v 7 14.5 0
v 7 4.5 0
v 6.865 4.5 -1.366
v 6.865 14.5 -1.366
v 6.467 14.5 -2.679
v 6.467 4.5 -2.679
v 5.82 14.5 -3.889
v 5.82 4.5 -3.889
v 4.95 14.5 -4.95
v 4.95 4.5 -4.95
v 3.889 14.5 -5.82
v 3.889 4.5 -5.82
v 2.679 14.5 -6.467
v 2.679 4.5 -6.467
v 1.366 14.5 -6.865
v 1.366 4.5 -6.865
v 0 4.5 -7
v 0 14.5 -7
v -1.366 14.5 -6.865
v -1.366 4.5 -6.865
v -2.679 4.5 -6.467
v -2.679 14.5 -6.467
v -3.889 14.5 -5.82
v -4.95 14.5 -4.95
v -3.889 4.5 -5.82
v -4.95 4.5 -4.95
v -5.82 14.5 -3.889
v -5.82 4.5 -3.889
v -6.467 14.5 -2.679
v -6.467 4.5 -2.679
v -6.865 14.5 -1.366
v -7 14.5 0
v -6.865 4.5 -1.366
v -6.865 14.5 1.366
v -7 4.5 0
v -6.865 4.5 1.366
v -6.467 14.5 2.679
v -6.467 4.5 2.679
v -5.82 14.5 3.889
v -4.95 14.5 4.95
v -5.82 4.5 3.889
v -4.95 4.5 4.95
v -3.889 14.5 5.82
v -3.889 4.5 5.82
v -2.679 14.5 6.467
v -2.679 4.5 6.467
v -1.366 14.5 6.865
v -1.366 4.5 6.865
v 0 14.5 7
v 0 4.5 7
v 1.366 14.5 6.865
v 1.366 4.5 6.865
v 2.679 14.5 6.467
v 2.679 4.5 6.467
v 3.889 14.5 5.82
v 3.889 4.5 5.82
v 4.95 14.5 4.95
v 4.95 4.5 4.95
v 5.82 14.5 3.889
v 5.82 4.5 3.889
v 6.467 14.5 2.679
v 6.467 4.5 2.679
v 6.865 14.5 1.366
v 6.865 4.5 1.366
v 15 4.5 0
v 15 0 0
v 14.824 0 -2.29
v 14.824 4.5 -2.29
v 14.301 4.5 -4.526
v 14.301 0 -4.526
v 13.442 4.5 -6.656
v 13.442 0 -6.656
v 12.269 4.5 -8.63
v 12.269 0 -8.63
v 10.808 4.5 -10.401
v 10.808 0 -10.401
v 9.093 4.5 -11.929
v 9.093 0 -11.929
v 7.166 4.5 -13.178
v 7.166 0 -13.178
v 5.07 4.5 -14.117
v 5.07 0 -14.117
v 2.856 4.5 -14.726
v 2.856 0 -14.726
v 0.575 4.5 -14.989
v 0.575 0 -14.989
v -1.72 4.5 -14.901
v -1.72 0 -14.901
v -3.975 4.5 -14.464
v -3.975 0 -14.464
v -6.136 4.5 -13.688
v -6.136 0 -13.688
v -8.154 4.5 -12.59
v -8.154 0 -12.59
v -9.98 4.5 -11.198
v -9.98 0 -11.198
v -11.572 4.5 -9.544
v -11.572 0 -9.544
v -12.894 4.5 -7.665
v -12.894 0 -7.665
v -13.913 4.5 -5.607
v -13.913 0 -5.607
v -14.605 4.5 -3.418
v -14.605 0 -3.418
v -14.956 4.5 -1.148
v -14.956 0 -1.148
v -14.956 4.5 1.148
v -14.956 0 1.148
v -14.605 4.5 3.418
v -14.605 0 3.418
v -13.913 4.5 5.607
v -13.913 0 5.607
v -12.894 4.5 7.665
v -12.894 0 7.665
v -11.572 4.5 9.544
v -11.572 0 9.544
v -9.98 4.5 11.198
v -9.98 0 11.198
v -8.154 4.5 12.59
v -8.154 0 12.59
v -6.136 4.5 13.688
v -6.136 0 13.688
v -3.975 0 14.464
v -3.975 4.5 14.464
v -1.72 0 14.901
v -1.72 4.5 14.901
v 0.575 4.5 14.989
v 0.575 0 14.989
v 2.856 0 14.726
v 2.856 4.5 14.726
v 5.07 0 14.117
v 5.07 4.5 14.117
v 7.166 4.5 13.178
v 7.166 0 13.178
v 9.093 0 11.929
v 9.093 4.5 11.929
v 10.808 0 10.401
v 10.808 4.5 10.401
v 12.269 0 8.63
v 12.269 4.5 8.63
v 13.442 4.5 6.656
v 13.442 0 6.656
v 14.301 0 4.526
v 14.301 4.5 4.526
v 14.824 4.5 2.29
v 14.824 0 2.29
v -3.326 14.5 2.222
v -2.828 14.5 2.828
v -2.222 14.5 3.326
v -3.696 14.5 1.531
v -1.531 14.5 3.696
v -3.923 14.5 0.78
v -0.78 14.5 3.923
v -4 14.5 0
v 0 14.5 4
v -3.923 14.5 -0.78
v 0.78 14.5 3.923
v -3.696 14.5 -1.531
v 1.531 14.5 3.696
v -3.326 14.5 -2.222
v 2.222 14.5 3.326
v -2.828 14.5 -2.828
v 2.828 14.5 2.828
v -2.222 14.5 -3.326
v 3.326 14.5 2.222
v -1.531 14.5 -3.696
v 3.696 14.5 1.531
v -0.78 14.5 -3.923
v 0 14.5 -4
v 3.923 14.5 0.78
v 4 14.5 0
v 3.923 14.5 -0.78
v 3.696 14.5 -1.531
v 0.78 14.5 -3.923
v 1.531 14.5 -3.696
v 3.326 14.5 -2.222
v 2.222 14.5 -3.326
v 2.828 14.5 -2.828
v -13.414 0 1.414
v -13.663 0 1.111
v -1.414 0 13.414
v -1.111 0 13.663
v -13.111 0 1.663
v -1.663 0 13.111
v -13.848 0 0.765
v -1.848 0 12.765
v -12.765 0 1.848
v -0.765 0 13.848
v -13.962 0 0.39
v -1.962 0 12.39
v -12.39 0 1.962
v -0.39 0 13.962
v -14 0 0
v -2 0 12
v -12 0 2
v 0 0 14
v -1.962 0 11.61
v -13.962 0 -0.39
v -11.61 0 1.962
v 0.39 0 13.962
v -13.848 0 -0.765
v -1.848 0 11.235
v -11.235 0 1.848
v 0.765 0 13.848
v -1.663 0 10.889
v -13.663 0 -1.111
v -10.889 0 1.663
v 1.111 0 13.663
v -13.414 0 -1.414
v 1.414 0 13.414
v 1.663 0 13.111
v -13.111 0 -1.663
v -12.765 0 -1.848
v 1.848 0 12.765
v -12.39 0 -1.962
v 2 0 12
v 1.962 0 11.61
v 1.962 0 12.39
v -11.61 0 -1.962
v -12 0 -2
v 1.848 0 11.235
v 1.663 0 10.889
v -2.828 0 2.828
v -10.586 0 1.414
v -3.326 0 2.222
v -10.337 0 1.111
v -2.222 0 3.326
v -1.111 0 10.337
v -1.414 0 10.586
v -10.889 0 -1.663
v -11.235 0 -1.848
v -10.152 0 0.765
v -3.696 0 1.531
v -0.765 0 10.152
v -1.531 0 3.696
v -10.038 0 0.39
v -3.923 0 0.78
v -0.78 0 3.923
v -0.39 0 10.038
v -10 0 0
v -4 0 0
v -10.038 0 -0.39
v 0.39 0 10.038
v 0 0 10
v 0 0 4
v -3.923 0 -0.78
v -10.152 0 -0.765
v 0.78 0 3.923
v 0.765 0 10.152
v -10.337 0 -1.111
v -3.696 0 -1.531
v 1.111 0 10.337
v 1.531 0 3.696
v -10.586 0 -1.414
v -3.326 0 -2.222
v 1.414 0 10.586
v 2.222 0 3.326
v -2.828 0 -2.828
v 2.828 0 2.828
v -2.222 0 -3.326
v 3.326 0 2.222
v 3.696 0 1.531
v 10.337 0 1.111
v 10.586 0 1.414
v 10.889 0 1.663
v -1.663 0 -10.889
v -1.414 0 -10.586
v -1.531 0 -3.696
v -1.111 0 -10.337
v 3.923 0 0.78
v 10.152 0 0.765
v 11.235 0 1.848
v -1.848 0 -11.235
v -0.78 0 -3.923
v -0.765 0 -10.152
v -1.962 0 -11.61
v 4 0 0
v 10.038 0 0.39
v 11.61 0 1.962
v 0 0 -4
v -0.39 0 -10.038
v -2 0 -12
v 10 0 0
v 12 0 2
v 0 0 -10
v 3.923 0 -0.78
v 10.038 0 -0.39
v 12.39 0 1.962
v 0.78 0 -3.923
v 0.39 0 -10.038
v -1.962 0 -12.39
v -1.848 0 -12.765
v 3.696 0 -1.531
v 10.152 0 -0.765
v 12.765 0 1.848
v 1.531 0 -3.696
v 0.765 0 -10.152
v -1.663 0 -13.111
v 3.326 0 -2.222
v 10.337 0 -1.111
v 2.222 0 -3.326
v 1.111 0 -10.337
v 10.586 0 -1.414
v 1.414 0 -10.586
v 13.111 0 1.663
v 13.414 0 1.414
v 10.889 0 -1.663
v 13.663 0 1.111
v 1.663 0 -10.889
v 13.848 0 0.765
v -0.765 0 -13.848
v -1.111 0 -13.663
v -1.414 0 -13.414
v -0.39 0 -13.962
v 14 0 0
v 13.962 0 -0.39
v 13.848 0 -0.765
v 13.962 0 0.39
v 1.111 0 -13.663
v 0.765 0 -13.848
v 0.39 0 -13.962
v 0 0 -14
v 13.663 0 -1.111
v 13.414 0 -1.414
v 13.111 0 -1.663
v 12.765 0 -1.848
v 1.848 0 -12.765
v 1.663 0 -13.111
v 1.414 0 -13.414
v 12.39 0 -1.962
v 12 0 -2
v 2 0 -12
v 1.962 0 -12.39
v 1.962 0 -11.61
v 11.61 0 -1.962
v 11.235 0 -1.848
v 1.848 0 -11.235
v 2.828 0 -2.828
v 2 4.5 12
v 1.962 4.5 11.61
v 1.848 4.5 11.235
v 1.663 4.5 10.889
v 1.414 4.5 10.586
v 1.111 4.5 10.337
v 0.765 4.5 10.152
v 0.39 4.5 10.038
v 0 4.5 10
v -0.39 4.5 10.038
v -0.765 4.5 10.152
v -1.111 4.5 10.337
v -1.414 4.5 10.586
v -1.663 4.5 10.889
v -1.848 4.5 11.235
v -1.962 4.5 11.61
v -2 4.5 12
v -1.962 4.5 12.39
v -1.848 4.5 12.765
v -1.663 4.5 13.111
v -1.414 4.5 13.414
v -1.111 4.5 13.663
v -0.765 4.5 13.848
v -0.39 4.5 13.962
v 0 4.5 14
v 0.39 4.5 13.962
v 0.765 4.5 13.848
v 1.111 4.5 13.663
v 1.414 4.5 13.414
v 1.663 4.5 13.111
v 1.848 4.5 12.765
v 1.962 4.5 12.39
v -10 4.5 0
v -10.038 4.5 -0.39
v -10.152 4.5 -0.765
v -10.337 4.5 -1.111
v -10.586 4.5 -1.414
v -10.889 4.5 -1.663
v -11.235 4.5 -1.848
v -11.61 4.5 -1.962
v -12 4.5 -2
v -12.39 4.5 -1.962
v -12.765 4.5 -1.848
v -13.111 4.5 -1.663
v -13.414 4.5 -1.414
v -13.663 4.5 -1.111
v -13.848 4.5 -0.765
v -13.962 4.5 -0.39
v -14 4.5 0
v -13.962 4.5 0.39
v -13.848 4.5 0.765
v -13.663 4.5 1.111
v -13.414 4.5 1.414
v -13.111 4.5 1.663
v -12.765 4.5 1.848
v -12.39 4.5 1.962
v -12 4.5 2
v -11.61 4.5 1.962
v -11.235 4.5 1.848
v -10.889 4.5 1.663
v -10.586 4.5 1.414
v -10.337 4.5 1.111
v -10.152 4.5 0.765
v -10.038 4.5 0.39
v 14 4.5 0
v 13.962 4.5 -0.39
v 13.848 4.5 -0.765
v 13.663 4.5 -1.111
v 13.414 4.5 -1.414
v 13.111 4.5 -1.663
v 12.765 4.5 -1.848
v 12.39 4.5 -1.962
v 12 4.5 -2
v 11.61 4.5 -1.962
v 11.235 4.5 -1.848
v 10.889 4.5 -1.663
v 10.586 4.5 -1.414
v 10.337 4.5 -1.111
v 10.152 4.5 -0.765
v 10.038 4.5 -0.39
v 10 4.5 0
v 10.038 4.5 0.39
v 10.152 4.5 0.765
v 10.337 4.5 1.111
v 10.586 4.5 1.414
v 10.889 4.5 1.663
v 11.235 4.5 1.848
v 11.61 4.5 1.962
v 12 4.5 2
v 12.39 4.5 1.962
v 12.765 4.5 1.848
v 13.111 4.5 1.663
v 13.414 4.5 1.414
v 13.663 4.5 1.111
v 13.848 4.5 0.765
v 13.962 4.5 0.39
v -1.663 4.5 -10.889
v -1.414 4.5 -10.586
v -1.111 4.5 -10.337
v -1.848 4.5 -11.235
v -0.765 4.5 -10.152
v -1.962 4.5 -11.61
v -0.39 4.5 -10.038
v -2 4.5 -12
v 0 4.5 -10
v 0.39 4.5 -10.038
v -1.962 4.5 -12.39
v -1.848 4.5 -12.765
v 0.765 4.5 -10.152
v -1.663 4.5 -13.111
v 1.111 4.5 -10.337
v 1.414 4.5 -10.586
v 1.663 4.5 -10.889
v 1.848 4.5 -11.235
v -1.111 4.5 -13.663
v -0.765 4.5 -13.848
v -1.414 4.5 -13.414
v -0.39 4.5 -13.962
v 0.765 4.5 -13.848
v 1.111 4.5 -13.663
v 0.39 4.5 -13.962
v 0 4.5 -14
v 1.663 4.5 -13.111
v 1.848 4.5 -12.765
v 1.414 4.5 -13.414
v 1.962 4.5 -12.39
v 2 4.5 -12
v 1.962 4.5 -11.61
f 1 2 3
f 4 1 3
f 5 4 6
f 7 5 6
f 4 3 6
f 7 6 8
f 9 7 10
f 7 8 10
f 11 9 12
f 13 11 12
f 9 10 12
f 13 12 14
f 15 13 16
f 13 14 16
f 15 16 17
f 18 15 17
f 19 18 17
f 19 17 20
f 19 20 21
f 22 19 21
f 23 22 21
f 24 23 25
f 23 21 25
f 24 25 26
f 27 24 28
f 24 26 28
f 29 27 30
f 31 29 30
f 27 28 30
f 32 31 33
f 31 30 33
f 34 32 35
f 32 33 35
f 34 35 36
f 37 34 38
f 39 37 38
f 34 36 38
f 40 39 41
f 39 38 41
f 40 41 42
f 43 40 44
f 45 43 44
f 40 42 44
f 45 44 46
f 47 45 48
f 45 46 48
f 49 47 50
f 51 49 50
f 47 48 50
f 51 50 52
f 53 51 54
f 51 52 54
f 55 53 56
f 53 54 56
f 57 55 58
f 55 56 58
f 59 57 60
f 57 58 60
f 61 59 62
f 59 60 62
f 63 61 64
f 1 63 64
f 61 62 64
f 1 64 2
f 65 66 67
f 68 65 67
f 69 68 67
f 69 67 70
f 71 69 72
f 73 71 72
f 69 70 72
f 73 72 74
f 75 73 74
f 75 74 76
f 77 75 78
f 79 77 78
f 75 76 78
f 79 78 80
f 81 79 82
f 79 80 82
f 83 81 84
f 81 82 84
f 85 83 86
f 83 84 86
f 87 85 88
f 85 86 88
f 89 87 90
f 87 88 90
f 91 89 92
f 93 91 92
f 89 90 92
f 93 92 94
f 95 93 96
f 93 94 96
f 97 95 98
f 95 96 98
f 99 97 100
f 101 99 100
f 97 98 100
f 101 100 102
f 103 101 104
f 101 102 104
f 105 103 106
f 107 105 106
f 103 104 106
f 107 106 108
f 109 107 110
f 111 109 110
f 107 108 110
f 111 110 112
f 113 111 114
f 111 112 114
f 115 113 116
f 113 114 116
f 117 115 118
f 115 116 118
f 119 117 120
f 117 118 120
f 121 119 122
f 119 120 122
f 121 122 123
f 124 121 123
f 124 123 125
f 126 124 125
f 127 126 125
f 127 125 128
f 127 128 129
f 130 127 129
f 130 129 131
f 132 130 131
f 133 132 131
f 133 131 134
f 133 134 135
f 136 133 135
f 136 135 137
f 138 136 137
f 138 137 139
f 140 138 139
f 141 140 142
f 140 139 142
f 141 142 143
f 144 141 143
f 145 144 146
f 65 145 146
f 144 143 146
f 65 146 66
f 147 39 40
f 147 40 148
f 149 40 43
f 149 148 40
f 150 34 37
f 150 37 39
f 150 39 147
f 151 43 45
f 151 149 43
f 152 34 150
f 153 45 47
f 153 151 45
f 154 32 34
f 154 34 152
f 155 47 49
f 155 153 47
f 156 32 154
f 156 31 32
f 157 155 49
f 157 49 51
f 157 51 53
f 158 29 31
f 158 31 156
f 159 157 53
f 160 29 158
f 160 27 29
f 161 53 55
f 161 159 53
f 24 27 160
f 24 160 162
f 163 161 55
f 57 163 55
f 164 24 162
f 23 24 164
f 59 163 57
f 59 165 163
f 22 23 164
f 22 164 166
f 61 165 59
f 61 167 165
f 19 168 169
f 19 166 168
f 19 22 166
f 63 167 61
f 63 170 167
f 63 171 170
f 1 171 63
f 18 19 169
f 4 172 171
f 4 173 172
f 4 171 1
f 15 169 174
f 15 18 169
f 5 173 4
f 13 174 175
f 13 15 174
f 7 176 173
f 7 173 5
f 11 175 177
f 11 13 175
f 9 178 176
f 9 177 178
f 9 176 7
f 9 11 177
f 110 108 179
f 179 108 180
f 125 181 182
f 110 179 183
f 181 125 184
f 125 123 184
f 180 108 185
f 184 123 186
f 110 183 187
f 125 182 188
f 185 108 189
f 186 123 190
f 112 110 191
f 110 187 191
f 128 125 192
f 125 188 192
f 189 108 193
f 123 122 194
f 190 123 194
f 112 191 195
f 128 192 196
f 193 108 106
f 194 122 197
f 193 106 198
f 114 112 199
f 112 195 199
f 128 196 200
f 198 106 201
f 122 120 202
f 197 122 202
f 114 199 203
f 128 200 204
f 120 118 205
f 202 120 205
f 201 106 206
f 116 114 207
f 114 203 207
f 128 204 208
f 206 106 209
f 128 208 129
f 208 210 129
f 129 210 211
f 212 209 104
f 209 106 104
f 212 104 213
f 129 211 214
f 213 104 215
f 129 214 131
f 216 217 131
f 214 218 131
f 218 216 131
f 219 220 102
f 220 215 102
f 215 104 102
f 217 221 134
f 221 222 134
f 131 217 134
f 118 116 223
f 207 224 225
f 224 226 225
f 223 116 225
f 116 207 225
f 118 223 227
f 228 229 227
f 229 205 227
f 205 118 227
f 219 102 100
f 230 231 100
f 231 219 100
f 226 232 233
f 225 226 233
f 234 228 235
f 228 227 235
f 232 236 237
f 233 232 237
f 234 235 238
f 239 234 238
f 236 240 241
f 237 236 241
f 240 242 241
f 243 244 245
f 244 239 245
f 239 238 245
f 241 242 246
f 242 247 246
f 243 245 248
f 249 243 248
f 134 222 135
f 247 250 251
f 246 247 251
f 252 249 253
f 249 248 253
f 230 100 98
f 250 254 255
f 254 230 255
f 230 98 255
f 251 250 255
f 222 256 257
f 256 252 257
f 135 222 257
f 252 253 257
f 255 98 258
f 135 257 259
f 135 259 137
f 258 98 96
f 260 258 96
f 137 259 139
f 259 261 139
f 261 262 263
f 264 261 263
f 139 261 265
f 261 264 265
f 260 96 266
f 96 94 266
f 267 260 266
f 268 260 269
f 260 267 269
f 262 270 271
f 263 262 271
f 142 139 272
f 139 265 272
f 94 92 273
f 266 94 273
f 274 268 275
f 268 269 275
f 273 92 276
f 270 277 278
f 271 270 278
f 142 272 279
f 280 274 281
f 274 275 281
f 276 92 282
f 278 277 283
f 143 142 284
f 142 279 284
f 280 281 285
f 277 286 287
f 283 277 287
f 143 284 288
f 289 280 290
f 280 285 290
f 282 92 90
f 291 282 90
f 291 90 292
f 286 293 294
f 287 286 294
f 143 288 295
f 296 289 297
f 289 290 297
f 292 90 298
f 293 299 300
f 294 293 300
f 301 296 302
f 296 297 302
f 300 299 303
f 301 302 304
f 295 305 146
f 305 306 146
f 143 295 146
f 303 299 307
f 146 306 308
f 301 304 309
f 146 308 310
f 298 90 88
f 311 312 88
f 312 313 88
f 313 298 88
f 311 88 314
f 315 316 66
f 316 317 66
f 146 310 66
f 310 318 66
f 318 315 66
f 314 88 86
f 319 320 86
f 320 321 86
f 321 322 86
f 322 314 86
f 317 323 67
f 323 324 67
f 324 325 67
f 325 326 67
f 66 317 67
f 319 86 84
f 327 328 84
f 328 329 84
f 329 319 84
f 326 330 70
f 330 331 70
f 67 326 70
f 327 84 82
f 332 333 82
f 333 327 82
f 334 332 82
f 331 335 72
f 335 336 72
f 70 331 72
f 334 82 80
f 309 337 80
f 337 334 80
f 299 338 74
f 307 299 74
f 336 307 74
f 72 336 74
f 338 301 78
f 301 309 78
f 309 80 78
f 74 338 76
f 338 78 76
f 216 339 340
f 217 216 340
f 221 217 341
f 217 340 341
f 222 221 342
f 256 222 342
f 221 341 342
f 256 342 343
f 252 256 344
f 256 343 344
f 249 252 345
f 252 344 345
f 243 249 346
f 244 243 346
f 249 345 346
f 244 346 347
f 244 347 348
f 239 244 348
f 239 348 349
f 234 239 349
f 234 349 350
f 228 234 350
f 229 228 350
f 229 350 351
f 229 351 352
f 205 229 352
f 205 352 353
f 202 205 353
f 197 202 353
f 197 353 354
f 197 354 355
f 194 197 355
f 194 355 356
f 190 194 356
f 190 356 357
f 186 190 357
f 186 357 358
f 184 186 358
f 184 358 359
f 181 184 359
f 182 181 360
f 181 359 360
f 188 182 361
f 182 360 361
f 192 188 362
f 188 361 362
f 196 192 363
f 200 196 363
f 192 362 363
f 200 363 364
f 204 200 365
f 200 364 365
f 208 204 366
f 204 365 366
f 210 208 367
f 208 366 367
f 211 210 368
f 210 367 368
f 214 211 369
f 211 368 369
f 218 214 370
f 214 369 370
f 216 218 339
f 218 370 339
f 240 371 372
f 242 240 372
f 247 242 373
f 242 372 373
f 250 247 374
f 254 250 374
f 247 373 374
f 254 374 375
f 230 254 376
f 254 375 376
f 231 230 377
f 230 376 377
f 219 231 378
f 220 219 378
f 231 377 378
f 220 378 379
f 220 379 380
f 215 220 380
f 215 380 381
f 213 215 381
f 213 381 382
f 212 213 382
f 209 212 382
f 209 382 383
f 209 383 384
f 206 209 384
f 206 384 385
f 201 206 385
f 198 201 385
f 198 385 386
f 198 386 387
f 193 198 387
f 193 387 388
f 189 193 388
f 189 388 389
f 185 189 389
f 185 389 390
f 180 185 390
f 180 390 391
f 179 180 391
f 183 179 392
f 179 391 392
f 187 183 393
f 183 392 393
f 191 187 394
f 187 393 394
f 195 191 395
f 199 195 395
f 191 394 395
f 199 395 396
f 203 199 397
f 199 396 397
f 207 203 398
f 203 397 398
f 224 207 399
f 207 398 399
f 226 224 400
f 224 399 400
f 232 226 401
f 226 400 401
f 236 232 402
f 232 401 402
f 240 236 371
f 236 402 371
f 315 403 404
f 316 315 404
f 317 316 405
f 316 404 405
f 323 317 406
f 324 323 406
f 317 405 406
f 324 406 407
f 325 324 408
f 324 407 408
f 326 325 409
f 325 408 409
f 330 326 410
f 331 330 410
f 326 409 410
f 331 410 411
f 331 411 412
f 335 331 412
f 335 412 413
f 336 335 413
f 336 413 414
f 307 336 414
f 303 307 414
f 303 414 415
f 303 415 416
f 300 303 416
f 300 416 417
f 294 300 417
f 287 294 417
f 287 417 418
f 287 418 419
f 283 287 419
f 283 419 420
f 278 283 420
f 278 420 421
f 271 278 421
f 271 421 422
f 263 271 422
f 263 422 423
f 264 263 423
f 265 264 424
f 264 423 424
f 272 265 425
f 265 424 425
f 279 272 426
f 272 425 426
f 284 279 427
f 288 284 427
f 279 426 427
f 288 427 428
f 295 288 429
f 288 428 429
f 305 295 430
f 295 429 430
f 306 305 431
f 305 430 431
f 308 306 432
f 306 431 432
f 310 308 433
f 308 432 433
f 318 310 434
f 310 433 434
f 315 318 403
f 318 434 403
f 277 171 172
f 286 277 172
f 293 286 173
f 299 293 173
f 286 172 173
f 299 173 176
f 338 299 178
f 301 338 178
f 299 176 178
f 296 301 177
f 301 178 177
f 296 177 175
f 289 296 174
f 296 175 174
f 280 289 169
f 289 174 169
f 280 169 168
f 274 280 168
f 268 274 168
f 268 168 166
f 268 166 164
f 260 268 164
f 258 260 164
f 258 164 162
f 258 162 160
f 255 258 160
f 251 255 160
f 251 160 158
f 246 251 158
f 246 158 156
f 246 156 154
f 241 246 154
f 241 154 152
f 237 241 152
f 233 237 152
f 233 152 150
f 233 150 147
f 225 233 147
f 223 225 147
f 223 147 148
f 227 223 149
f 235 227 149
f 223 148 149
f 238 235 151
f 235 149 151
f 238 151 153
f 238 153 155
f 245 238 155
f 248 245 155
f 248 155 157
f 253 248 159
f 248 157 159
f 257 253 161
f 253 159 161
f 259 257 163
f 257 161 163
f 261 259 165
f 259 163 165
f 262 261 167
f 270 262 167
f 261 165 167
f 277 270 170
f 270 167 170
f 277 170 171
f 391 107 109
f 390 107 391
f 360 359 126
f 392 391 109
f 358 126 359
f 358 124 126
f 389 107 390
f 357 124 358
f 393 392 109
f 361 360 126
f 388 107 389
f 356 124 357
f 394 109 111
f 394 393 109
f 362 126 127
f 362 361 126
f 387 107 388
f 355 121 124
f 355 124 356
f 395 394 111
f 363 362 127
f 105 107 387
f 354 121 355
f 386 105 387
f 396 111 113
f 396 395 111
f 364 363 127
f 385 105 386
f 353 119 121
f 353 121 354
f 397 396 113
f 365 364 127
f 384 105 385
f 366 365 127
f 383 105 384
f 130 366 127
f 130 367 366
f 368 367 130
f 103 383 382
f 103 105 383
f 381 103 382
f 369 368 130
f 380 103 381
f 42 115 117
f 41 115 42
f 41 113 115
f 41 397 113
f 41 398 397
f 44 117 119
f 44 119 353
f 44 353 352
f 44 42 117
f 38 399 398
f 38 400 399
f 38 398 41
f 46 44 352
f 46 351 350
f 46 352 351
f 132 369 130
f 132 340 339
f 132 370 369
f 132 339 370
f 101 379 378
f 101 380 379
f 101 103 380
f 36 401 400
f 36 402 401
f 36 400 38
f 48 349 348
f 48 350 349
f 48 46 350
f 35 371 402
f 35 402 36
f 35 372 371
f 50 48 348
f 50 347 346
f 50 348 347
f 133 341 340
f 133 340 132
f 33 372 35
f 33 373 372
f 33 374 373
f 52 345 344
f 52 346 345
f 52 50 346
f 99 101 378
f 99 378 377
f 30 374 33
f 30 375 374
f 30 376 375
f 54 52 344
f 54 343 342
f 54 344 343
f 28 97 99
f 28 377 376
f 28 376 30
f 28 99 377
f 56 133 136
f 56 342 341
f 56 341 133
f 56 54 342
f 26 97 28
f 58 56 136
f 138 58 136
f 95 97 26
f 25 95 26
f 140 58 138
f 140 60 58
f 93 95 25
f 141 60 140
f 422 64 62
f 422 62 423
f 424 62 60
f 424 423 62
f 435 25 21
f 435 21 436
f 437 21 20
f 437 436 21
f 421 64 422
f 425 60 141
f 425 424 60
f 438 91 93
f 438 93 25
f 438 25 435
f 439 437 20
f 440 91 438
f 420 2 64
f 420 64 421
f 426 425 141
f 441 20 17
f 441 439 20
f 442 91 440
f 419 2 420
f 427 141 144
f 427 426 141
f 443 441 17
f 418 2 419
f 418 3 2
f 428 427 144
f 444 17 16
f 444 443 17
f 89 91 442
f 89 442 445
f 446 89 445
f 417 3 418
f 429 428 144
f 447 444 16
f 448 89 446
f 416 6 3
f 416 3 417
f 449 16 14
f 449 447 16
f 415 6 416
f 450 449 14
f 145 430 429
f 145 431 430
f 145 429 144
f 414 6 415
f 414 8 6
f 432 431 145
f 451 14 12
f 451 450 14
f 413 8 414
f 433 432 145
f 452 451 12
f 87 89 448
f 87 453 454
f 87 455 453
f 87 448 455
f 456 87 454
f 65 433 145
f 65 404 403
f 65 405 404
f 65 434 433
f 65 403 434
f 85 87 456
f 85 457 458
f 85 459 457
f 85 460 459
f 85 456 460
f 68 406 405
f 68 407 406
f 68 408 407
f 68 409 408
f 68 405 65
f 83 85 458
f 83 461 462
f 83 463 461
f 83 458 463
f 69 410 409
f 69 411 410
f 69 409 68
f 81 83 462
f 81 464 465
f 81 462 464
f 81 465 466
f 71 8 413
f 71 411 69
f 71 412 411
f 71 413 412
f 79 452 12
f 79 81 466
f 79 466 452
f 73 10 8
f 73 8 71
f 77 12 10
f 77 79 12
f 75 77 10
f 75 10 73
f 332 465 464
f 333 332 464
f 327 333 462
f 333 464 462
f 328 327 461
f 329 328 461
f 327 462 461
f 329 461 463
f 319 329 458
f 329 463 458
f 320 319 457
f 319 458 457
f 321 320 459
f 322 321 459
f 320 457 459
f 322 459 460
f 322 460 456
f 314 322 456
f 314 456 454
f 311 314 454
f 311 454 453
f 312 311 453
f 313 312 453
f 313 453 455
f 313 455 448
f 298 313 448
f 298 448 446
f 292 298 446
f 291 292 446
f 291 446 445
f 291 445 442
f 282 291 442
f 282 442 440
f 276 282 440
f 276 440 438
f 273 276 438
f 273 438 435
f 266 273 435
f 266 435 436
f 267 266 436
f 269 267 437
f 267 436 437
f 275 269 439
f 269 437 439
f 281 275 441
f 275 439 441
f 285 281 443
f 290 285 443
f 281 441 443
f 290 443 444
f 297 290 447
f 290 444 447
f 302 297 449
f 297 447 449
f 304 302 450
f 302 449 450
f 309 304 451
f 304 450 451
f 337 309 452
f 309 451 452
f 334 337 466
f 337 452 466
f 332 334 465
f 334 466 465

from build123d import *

# Parameters (mm, degrees)
SKETCH1_R           = 15
BOSS_EXTRUDE1_DEPTH = 4.5
SKETCH3_R           = 7
BOSS_EXTRUDE2_DEPTH = 10
SKETCH4_R           = 4
CUT_EXTRUDE1_DEPTH  = 15
SKETCH5_R           = 2
CUT_EXTRUDE2_DEPTH  = 10


with BuildPart() as part:
    # Sketch1 → Boss-Extrude1 (new body)
    with BuildSketch(Plane(origin=(0, 0, 0), x_dir=(1, 0, 0), z_dir=(0, 1, 0))):
        Circle(SKETCH1_R)
    extrude(amount=BOSS_EXTRUDE1_DEPTH)

    # Sketch3 → Boss-Extrude2 (add)
    with BuildSketch(Plane(origin=(0, 4.5, 0), x_dir=(1, 0, 0), z_dir=(0, 1, 0))):
        Circle(SKETCH3_R)
    extrude(amount=BOSS_EXTRUDE2_DEPTH)

    # Sketch4 → Cut-Extrude1 (cut)
    with BuildSketch(Plane(origin=(0, 14.5, 0), x_dir=(1, 0, 0), z_dir=(0, 1, 0))):
        Circle(SKETCH4_R)
    extrude(amount=-CUT_EXTRUDE1_DEPTH, mode=Mode.SUBTRACT)

    # Sketch5 → Cut-Extrude2 (cut)
    with BuildSketch(Plane(origin=(0, 4.5, 0), x_dir=(1, 0, 0), z_dir=(0, 1, 0))):
        with Locations((0, 12)):
            Circle(SKETCH5_R)
        with Locations((12, 0)):
            Circle(SKETCH5_R)
        with Locations((0, -12)):
            Circle(SKETCH5_R)
        with Locations((-12, 0)):
            Circle(SKETCH5_R)
    extrude(amount=-CUT_EXTRUDE2_DEPTH, mode=Mode.SUBTRACT)


solid = part.part
